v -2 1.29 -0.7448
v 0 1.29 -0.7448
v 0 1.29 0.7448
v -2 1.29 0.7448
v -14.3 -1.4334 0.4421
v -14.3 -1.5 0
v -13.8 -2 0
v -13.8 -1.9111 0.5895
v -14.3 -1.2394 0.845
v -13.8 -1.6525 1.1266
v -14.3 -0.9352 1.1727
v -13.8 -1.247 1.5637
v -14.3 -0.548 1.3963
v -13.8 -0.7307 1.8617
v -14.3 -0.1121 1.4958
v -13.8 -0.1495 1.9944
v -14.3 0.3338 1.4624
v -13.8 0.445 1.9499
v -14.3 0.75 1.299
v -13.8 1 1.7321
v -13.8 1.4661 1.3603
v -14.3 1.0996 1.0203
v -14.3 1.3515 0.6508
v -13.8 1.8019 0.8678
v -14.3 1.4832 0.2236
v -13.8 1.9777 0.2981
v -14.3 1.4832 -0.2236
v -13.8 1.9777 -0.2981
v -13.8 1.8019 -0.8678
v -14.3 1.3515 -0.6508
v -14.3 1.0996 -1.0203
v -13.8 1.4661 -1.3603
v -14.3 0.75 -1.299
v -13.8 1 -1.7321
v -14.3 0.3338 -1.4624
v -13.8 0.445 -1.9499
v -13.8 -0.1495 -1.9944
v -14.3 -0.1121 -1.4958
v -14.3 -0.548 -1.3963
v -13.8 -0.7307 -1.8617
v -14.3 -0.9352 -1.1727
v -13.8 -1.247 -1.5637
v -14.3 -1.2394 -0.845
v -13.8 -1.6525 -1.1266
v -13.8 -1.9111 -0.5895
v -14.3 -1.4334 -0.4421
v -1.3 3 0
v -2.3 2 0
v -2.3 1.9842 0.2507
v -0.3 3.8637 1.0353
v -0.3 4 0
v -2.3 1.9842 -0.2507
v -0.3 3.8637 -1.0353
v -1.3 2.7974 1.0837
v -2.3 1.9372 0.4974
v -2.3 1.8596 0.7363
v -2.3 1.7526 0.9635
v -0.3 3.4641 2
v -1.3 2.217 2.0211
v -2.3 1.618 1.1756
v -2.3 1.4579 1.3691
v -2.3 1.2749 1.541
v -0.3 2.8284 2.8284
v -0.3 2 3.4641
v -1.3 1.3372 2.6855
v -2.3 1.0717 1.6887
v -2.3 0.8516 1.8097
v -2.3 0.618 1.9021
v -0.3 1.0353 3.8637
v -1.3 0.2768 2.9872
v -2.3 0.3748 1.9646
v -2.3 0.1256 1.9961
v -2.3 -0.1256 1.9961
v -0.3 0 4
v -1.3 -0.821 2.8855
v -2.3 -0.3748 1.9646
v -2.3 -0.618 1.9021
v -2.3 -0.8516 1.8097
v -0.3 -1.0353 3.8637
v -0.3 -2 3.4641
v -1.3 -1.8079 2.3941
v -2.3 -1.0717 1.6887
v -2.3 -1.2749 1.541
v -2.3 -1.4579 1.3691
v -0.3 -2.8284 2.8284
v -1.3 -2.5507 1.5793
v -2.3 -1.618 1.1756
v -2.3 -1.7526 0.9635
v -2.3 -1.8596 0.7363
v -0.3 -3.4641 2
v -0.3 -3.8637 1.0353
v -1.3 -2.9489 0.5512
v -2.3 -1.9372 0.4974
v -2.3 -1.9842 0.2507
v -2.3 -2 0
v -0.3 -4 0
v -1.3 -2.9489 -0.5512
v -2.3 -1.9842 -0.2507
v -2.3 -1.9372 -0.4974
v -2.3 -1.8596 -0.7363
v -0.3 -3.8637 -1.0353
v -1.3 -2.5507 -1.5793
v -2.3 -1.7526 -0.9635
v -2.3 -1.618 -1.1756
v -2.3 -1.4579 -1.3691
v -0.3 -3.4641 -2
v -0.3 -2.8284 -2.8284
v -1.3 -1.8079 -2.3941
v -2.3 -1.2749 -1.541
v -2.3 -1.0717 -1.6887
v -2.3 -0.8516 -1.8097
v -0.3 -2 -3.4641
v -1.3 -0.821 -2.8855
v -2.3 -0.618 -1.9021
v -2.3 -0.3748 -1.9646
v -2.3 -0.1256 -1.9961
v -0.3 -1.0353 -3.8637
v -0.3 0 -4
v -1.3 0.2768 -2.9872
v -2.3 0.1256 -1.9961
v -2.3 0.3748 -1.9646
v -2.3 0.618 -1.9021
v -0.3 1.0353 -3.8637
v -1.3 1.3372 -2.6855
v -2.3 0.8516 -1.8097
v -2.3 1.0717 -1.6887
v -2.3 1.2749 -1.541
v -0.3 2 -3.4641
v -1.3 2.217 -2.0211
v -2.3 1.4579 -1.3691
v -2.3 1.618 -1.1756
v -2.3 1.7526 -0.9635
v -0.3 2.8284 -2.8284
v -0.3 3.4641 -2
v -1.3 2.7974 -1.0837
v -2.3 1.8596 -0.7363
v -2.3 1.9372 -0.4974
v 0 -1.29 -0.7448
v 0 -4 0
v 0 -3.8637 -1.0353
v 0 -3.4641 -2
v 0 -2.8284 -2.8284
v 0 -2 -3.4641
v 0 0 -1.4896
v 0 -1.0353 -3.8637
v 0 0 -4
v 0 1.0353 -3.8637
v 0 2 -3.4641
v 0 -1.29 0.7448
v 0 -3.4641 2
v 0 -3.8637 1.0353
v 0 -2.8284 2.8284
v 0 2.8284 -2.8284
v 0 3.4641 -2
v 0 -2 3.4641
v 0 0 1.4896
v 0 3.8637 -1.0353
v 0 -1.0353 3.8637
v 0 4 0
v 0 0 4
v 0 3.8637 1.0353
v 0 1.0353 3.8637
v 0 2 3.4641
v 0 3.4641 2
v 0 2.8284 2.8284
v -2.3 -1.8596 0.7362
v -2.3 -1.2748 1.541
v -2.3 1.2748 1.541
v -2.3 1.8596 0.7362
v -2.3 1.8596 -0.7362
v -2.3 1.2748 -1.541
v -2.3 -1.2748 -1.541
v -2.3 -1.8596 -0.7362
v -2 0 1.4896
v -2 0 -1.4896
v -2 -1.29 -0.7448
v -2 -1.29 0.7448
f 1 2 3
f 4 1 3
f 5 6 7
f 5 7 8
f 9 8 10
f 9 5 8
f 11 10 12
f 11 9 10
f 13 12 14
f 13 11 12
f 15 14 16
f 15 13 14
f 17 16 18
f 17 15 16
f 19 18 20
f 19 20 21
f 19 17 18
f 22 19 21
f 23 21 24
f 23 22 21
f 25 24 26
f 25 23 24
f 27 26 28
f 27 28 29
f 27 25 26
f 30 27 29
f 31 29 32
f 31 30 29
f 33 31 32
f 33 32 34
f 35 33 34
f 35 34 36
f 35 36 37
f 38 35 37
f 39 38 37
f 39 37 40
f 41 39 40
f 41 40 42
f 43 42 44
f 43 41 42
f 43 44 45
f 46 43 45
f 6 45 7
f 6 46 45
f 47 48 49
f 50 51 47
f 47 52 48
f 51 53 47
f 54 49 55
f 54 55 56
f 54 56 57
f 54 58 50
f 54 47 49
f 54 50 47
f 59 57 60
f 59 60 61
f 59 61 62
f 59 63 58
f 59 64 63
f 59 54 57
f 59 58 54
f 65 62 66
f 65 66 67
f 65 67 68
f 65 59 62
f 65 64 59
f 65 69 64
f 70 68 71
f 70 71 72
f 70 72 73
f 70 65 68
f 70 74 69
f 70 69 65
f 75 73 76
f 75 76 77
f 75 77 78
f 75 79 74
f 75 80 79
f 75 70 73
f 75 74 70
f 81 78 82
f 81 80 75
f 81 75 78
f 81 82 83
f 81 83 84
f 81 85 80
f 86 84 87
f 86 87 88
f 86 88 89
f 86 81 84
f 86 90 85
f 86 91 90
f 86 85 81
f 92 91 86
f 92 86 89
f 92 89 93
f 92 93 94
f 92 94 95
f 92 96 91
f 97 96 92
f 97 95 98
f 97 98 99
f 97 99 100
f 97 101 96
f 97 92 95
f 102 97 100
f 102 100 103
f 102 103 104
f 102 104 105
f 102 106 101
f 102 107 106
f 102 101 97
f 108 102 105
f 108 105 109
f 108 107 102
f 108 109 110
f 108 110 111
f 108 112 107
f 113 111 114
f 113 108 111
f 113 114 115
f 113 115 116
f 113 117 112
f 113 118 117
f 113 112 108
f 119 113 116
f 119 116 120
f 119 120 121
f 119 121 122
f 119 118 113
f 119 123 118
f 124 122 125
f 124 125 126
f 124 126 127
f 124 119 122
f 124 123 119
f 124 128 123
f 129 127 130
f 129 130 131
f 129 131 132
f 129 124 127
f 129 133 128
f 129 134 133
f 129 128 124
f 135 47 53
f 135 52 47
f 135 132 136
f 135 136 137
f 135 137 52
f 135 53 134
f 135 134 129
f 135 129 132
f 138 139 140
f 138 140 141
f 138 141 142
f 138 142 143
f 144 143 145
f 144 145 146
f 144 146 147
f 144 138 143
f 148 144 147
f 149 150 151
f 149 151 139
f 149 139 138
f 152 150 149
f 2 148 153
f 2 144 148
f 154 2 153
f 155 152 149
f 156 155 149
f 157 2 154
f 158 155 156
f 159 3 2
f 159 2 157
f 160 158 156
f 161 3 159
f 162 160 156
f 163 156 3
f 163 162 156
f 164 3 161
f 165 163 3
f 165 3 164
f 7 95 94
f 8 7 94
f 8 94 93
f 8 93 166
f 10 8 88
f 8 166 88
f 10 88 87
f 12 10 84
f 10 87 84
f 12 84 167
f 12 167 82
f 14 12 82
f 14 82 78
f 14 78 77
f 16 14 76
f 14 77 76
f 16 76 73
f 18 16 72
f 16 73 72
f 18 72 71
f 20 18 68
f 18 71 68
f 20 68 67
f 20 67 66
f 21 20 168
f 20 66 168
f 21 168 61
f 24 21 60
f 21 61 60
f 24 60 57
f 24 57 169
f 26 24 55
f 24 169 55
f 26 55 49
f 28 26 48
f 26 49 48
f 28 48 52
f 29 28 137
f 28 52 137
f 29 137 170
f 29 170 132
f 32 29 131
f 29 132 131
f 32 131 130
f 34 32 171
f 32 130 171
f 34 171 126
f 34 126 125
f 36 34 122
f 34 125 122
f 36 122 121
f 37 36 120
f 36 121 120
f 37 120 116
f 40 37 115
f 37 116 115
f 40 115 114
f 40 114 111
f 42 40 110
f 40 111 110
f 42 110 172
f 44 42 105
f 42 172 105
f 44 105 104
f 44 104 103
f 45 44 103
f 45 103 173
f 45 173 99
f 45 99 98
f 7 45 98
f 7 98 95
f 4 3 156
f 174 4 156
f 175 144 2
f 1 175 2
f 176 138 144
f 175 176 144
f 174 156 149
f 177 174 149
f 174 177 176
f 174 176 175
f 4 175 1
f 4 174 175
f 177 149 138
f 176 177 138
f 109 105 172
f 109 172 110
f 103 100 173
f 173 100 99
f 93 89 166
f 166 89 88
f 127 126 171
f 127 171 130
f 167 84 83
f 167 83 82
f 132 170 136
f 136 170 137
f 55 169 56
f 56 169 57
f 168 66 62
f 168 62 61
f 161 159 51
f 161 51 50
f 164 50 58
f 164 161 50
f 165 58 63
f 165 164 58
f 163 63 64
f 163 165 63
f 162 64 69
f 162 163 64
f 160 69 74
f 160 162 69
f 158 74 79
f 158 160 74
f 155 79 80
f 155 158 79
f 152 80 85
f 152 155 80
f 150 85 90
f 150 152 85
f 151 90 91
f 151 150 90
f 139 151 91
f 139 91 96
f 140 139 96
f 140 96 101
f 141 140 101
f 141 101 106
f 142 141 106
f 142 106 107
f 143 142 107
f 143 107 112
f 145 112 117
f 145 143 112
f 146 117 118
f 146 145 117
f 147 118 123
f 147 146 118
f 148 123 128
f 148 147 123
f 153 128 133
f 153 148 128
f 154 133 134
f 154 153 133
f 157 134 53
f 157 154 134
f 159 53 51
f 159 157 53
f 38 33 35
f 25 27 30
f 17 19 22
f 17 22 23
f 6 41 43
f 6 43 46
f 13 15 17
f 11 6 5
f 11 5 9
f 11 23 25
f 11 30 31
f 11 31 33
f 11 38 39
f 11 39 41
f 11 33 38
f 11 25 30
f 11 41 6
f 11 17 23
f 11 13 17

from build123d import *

# Parameters (mm, degrees)
F0_R     = 4
F1_DEPTH = 2.3
F2_R     = 2
F3_DEPTH = 12
F4_SIZE  = 0.5
F5_SIZE2 = 1.99999
F5_SIZE  = 1.99999
F7_DEPTH = 2


# Not quite as in the source:
# - a fillet or chamfer is up to 0.001 mm smaller than in the source, because OpenCascade refuses the exact size


with BuildPart() as f1:
    # F0 (on Right) → F1 (new body)
    with BuildSketch(Plane.YZ):
        Circle(F0_R)
    extrude(amount=-F1_DEPTH)

    # F2 (on face) → F3 (join)
    with BuildSketch(Plane(origin=(-2.3, 0, 0), x_dir=(0, -1, 0), z_dir=(-1, 0, 0))):
        Circle(F2_R)
    extrude(amount=F3_DEPTH)

    # F4
    f4_edges = [f1.edges().sort_by_distance(p)[0] for p in [
        (-14.3, 2, 0),
    ]]
    chamfer(f4_edges, length=F4_SIZE)

    # F5 (size 2 and 2 in the source; OpenCascade refuses exactly that, so slightly less here)
    f5_edges = [f1.edges().sort_by_distance(p)[0] for p in [
        (-2.3, -4, 0),
    ]]
    chamfer(f5_edges, length=F5_SIZE, length2=F5_SIZE2)

    # F6 (on face) → F7 (cut)
    with BuildSketch(Plane.YZ):
        Polygon((0, -1.4895636945), (1.29, -0.7447818473), (1.29, 0.7447818473), (0, 1.4895636945), (-1.29, 0.7447818473), (-1.29, -0.7447818473), align=None)
    extrude(amount=-F7_DEPTH, mode=Mode.SUBTRACT)


solid = f1.part
